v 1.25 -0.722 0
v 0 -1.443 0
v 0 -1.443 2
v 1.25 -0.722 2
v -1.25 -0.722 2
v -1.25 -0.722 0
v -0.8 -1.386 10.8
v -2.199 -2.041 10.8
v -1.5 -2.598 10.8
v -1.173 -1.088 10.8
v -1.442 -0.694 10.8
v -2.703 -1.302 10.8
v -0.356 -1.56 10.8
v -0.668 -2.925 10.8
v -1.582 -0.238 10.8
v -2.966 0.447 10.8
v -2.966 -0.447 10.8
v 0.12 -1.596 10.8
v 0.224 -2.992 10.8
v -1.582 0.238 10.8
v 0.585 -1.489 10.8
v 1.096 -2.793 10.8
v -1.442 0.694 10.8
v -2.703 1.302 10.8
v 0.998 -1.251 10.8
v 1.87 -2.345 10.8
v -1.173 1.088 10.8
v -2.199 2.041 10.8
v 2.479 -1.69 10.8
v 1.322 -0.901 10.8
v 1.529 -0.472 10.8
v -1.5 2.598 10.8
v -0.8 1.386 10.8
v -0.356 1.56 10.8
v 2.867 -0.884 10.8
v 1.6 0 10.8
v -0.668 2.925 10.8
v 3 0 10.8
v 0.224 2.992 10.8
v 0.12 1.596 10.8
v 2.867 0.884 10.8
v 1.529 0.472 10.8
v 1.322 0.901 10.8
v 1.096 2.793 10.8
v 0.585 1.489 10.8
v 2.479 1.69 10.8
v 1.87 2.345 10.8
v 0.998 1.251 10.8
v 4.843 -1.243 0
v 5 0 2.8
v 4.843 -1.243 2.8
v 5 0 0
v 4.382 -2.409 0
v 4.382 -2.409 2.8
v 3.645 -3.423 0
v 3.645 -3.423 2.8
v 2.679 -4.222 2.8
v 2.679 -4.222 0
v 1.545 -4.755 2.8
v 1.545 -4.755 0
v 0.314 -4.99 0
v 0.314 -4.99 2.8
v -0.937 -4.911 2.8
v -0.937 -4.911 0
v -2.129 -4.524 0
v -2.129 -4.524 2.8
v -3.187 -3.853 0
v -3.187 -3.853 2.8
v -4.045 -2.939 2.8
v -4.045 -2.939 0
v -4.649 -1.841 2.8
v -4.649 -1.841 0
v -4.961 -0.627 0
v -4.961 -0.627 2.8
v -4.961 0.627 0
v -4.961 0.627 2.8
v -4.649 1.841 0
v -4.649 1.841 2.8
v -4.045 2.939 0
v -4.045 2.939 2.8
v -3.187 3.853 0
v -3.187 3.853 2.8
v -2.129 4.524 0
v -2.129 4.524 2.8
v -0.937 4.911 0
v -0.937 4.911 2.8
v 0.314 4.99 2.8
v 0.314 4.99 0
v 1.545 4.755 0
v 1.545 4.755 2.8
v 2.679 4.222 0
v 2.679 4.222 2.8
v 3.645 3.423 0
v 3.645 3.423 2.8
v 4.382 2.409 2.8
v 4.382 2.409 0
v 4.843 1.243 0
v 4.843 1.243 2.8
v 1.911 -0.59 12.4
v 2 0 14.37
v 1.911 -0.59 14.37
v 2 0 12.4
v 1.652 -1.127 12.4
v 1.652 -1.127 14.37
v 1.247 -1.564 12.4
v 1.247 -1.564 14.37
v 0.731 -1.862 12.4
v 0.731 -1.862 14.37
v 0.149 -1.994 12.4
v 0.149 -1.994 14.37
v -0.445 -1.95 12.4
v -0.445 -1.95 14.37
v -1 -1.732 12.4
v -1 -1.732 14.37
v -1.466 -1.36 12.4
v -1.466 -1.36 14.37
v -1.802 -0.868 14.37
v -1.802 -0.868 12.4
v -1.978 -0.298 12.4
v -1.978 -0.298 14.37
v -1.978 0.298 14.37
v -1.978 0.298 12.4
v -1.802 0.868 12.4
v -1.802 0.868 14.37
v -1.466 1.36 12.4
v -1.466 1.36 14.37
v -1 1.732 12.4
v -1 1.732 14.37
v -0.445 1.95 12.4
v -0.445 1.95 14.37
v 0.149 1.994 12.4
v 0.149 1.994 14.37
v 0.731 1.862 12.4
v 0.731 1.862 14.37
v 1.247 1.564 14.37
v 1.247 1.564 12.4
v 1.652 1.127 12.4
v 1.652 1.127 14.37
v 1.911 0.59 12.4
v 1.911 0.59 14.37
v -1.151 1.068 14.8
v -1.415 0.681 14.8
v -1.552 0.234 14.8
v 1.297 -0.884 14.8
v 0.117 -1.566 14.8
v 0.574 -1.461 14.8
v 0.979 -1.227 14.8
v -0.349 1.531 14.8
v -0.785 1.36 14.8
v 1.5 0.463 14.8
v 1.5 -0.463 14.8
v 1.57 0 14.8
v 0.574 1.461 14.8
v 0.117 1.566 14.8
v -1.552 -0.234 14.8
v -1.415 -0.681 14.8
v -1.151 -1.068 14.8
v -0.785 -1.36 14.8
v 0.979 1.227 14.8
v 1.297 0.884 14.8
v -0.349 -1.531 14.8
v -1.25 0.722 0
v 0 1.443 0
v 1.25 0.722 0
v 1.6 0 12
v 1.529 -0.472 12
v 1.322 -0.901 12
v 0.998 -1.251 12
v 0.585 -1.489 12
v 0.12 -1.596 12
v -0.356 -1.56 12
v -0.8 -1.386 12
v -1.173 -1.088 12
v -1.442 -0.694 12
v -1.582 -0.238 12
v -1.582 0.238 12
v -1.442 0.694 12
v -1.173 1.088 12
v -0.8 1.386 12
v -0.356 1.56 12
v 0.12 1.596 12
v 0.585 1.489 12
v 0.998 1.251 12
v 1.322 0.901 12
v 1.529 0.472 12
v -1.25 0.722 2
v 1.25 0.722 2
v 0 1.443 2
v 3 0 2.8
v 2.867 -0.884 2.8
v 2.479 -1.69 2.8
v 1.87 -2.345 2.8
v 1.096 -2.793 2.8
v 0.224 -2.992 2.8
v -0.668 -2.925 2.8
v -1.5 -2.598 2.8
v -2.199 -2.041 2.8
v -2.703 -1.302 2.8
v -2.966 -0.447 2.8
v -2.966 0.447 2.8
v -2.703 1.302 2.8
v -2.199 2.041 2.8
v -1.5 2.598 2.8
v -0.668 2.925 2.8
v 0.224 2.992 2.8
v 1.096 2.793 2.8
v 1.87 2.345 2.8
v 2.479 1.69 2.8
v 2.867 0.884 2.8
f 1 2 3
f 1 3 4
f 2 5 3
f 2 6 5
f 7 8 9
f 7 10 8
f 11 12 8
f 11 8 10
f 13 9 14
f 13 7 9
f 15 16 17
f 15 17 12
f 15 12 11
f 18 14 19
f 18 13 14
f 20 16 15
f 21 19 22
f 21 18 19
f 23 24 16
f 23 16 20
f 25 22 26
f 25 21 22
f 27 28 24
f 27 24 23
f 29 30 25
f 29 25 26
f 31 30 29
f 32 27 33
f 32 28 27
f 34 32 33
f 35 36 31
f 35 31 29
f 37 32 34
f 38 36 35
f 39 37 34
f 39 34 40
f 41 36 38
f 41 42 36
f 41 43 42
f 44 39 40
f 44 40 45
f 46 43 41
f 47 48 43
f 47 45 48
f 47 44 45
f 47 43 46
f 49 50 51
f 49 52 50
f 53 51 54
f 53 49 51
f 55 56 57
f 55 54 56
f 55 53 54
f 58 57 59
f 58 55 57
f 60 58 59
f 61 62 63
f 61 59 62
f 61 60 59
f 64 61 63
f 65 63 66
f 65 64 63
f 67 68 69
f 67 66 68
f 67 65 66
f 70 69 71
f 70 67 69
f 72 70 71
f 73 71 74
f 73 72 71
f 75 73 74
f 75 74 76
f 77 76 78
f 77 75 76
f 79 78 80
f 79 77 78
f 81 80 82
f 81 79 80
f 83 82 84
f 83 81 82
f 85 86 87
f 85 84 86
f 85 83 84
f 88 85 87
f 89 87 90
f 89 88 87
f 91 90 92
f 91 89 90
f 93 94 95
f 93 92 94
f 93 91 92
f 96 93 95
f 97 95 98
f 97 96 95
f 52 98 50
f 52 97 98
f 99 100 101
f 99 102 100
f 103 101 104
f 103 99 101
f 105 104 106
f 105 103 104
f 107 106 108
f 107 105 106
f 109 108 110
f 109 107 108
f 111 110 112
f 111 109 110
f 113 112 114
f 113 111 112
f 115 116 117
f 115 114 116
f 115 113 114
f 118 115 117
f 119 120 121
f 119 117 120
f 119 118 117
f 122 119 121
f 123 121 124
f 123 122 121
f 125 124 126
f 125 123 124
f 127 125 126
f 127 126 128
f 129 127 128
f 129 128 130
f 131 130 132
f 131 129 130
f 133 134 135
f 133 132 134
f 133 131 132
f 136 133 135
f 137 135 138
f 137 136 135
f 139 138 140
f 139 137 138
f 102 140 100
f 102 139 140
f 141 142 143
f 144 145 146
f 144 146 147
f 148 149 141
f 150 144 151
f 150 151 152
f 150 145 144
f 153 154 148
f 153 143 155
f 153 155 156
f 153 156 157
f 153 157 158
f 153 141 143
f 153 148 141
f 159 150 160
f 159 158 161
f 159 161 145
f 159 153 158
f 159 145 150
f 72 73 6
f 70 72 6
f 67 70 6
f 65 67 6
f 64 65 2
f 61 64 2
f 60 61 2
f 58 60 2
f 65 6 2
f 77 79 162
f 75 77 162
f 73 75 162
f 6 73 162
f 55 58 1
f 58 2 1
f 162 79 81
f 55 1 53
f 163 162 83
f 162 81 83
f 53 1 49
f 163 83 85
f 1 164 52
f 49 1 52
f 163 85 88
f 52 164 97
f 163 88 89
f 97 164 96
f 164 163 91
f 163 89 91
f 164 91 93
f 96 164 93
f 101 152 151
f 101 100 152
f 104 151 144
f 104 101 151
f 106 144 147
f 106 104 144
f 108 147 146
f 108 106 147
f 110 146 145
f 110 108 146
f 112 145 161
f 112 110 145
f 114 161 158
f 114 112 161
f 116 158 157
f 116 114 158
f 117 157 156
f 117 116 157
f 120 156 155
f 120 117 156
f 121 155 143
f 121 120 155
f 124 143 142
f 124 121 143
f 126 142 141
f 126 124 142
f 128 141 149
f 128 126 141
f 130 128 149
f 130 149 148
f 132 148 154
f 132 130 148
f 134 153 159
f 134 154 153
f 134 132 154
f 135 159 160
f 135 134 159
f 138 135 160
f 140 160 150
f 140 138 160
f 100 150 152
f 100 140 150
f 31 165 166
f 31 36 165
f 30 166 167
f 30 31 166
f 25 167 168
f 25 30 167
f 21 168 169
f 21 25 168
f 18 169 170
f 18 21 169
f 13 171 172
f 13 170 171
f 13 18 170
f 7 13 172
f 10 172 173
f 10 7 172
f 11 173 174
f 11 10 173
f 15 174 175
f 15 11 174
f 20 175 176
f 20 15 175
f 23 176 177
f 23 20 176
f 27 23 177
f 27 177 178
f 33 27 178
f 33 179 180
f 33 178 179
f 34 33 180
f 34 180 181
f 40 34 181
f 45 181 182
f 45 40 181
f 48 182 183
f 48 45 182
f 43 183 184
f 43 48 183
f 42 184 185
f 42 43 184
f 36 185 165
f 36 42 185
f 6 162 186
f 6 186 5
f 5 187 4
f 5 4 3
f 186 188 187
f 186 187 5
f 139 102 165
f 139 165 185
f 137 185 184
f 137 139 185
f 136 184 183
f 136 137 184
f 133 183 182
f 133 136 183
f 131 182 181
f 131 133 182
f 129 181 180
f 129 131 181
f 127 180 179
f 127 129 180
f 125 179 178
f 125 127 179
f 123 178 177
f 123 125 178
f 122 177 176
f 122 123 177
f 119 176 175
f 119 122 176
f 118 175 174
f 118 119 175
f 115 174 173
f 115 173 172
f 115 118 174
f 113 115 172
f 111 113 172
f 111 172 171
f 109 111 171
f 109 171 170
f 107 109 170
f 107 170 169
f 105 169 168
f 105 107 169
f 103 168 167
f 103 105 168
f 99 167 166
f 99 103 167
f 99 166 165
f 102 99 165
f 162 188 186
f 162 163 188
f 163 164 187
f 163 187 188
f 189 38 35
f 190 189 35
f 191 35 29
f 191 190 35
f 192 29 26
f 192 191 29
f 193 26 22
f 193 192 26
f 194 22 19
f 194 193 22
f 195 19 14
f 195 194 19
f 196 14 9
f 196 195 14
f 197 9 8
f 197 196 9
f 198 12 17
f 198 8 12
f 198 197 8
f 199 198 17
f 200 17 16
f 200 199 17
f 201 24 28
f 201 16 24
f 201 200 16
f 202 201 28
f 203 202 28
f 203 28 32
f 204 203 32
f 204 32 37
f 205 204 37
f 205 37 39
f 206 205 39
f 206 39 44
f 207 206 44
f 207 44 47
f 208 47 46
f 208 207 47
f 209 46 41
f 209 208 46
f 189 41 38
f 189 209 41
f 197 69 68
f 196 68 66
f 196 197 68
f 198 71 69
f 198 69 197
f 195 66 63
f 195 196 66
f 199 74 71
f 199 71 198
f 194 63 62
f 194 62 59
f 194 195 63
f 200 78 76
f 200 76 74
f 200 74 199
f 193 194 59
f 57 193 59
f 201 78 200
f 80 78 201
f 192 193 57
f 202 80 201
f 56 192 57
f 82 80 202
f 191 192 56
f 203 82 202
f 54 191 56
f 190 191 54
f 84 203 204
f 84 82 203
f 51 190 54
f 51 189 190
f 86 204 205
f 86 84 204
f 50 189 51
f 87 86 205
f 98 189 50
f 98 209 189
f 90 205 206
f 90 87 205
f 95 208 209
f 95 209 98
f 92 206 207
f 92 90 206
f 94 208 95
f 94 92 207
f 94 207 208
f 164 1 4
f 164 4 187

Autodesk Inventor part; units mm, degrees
ref_plane "YZ Plane" through (0, 0, 0) normal (1, 0, 0) x (0, 1, 0)
ref_plane "XZ Plane" through (0, 0, 0) normal (0, 1, 0) x (-1, 0, 0)
ref_plane "XY Plane" through (0, 0, 0) normal (0, 0, 1) x (1, 0, 0)
sketch "Sketch1" plane through (0, 0, 0) normal (0, 1, 0) x (-1, 0, 0)
  line L0 (0, 0) -> (0, 14.8)
  line L1 (0, 14.8) -> (-2, 14.8)
  line L2 (-2, 14.8) -> (-2, 12.4)
  line L3 (-3, 10.8) -> (-3, 2.8)
  line L4 (-3, 2.8) -> (-5, 2.8)
  line L5 (-5, 2.8) -> (-5, 0)
  line L6 (-5, 0) -> (0, 0)
  line L7 (-1.6, 12) -> (-1.6, 10.8)
  line L8 (-3, 10.8) -> (-1.6, 10.8)
  line L9 (-1.6, 12) -> (-2, 12.4)
  dimension "d0" = 10
  dimension "d1" = 6
  dimension "d2" = 4
  dimension "d4" = 8
  dimension "d5" = 2.8
  dimension "d15" = 4
  dimension "d16" = 3.2
  dimension "d17" = 1.2
  dimension "d18" = 45
revolve "Revolution1" add sketch "Sketch1" angle 360 about axis through (0, 0, 0) along (0, 0, 1)
thread "Thread1" size "M4x0.7" class "6g" standard "ANSI Metric M Profile" length 6
sketch "Sketch2" plane through (0, 0, 0) normal (0, 0, -1) x (-1, 0, 0)
  line L0 (0, 1.4434) -> (1.25, 0.7217)
  line L1 (1.25, 0.7217) -> (1.25, -0.7217)
  line L2 (1.25, -0.7217) -> (0, -1.4434)
  line L3 (0, -1.4434) -> (-1.25, -0.7217)
  line L4 (-1.25, -0.7217) -> (-1.25, 0.7217)
  line L5 (-1.25, 0.7217) -> (0, 1.4434)
  point P0 (0, 0)
  point P1 (0, 0)
  dimension "d9" = 2.5
extrude "Extrusion1" cut sketch "Sketch2" against normal blind 2
chamfer "Chamfer1" distance 0.43 angle 45 1 edges at (-2, 0, 14.8)
properties part number "DBTSY4-8-4-DHC-PC" material "Stainless Steel AISI 304"
